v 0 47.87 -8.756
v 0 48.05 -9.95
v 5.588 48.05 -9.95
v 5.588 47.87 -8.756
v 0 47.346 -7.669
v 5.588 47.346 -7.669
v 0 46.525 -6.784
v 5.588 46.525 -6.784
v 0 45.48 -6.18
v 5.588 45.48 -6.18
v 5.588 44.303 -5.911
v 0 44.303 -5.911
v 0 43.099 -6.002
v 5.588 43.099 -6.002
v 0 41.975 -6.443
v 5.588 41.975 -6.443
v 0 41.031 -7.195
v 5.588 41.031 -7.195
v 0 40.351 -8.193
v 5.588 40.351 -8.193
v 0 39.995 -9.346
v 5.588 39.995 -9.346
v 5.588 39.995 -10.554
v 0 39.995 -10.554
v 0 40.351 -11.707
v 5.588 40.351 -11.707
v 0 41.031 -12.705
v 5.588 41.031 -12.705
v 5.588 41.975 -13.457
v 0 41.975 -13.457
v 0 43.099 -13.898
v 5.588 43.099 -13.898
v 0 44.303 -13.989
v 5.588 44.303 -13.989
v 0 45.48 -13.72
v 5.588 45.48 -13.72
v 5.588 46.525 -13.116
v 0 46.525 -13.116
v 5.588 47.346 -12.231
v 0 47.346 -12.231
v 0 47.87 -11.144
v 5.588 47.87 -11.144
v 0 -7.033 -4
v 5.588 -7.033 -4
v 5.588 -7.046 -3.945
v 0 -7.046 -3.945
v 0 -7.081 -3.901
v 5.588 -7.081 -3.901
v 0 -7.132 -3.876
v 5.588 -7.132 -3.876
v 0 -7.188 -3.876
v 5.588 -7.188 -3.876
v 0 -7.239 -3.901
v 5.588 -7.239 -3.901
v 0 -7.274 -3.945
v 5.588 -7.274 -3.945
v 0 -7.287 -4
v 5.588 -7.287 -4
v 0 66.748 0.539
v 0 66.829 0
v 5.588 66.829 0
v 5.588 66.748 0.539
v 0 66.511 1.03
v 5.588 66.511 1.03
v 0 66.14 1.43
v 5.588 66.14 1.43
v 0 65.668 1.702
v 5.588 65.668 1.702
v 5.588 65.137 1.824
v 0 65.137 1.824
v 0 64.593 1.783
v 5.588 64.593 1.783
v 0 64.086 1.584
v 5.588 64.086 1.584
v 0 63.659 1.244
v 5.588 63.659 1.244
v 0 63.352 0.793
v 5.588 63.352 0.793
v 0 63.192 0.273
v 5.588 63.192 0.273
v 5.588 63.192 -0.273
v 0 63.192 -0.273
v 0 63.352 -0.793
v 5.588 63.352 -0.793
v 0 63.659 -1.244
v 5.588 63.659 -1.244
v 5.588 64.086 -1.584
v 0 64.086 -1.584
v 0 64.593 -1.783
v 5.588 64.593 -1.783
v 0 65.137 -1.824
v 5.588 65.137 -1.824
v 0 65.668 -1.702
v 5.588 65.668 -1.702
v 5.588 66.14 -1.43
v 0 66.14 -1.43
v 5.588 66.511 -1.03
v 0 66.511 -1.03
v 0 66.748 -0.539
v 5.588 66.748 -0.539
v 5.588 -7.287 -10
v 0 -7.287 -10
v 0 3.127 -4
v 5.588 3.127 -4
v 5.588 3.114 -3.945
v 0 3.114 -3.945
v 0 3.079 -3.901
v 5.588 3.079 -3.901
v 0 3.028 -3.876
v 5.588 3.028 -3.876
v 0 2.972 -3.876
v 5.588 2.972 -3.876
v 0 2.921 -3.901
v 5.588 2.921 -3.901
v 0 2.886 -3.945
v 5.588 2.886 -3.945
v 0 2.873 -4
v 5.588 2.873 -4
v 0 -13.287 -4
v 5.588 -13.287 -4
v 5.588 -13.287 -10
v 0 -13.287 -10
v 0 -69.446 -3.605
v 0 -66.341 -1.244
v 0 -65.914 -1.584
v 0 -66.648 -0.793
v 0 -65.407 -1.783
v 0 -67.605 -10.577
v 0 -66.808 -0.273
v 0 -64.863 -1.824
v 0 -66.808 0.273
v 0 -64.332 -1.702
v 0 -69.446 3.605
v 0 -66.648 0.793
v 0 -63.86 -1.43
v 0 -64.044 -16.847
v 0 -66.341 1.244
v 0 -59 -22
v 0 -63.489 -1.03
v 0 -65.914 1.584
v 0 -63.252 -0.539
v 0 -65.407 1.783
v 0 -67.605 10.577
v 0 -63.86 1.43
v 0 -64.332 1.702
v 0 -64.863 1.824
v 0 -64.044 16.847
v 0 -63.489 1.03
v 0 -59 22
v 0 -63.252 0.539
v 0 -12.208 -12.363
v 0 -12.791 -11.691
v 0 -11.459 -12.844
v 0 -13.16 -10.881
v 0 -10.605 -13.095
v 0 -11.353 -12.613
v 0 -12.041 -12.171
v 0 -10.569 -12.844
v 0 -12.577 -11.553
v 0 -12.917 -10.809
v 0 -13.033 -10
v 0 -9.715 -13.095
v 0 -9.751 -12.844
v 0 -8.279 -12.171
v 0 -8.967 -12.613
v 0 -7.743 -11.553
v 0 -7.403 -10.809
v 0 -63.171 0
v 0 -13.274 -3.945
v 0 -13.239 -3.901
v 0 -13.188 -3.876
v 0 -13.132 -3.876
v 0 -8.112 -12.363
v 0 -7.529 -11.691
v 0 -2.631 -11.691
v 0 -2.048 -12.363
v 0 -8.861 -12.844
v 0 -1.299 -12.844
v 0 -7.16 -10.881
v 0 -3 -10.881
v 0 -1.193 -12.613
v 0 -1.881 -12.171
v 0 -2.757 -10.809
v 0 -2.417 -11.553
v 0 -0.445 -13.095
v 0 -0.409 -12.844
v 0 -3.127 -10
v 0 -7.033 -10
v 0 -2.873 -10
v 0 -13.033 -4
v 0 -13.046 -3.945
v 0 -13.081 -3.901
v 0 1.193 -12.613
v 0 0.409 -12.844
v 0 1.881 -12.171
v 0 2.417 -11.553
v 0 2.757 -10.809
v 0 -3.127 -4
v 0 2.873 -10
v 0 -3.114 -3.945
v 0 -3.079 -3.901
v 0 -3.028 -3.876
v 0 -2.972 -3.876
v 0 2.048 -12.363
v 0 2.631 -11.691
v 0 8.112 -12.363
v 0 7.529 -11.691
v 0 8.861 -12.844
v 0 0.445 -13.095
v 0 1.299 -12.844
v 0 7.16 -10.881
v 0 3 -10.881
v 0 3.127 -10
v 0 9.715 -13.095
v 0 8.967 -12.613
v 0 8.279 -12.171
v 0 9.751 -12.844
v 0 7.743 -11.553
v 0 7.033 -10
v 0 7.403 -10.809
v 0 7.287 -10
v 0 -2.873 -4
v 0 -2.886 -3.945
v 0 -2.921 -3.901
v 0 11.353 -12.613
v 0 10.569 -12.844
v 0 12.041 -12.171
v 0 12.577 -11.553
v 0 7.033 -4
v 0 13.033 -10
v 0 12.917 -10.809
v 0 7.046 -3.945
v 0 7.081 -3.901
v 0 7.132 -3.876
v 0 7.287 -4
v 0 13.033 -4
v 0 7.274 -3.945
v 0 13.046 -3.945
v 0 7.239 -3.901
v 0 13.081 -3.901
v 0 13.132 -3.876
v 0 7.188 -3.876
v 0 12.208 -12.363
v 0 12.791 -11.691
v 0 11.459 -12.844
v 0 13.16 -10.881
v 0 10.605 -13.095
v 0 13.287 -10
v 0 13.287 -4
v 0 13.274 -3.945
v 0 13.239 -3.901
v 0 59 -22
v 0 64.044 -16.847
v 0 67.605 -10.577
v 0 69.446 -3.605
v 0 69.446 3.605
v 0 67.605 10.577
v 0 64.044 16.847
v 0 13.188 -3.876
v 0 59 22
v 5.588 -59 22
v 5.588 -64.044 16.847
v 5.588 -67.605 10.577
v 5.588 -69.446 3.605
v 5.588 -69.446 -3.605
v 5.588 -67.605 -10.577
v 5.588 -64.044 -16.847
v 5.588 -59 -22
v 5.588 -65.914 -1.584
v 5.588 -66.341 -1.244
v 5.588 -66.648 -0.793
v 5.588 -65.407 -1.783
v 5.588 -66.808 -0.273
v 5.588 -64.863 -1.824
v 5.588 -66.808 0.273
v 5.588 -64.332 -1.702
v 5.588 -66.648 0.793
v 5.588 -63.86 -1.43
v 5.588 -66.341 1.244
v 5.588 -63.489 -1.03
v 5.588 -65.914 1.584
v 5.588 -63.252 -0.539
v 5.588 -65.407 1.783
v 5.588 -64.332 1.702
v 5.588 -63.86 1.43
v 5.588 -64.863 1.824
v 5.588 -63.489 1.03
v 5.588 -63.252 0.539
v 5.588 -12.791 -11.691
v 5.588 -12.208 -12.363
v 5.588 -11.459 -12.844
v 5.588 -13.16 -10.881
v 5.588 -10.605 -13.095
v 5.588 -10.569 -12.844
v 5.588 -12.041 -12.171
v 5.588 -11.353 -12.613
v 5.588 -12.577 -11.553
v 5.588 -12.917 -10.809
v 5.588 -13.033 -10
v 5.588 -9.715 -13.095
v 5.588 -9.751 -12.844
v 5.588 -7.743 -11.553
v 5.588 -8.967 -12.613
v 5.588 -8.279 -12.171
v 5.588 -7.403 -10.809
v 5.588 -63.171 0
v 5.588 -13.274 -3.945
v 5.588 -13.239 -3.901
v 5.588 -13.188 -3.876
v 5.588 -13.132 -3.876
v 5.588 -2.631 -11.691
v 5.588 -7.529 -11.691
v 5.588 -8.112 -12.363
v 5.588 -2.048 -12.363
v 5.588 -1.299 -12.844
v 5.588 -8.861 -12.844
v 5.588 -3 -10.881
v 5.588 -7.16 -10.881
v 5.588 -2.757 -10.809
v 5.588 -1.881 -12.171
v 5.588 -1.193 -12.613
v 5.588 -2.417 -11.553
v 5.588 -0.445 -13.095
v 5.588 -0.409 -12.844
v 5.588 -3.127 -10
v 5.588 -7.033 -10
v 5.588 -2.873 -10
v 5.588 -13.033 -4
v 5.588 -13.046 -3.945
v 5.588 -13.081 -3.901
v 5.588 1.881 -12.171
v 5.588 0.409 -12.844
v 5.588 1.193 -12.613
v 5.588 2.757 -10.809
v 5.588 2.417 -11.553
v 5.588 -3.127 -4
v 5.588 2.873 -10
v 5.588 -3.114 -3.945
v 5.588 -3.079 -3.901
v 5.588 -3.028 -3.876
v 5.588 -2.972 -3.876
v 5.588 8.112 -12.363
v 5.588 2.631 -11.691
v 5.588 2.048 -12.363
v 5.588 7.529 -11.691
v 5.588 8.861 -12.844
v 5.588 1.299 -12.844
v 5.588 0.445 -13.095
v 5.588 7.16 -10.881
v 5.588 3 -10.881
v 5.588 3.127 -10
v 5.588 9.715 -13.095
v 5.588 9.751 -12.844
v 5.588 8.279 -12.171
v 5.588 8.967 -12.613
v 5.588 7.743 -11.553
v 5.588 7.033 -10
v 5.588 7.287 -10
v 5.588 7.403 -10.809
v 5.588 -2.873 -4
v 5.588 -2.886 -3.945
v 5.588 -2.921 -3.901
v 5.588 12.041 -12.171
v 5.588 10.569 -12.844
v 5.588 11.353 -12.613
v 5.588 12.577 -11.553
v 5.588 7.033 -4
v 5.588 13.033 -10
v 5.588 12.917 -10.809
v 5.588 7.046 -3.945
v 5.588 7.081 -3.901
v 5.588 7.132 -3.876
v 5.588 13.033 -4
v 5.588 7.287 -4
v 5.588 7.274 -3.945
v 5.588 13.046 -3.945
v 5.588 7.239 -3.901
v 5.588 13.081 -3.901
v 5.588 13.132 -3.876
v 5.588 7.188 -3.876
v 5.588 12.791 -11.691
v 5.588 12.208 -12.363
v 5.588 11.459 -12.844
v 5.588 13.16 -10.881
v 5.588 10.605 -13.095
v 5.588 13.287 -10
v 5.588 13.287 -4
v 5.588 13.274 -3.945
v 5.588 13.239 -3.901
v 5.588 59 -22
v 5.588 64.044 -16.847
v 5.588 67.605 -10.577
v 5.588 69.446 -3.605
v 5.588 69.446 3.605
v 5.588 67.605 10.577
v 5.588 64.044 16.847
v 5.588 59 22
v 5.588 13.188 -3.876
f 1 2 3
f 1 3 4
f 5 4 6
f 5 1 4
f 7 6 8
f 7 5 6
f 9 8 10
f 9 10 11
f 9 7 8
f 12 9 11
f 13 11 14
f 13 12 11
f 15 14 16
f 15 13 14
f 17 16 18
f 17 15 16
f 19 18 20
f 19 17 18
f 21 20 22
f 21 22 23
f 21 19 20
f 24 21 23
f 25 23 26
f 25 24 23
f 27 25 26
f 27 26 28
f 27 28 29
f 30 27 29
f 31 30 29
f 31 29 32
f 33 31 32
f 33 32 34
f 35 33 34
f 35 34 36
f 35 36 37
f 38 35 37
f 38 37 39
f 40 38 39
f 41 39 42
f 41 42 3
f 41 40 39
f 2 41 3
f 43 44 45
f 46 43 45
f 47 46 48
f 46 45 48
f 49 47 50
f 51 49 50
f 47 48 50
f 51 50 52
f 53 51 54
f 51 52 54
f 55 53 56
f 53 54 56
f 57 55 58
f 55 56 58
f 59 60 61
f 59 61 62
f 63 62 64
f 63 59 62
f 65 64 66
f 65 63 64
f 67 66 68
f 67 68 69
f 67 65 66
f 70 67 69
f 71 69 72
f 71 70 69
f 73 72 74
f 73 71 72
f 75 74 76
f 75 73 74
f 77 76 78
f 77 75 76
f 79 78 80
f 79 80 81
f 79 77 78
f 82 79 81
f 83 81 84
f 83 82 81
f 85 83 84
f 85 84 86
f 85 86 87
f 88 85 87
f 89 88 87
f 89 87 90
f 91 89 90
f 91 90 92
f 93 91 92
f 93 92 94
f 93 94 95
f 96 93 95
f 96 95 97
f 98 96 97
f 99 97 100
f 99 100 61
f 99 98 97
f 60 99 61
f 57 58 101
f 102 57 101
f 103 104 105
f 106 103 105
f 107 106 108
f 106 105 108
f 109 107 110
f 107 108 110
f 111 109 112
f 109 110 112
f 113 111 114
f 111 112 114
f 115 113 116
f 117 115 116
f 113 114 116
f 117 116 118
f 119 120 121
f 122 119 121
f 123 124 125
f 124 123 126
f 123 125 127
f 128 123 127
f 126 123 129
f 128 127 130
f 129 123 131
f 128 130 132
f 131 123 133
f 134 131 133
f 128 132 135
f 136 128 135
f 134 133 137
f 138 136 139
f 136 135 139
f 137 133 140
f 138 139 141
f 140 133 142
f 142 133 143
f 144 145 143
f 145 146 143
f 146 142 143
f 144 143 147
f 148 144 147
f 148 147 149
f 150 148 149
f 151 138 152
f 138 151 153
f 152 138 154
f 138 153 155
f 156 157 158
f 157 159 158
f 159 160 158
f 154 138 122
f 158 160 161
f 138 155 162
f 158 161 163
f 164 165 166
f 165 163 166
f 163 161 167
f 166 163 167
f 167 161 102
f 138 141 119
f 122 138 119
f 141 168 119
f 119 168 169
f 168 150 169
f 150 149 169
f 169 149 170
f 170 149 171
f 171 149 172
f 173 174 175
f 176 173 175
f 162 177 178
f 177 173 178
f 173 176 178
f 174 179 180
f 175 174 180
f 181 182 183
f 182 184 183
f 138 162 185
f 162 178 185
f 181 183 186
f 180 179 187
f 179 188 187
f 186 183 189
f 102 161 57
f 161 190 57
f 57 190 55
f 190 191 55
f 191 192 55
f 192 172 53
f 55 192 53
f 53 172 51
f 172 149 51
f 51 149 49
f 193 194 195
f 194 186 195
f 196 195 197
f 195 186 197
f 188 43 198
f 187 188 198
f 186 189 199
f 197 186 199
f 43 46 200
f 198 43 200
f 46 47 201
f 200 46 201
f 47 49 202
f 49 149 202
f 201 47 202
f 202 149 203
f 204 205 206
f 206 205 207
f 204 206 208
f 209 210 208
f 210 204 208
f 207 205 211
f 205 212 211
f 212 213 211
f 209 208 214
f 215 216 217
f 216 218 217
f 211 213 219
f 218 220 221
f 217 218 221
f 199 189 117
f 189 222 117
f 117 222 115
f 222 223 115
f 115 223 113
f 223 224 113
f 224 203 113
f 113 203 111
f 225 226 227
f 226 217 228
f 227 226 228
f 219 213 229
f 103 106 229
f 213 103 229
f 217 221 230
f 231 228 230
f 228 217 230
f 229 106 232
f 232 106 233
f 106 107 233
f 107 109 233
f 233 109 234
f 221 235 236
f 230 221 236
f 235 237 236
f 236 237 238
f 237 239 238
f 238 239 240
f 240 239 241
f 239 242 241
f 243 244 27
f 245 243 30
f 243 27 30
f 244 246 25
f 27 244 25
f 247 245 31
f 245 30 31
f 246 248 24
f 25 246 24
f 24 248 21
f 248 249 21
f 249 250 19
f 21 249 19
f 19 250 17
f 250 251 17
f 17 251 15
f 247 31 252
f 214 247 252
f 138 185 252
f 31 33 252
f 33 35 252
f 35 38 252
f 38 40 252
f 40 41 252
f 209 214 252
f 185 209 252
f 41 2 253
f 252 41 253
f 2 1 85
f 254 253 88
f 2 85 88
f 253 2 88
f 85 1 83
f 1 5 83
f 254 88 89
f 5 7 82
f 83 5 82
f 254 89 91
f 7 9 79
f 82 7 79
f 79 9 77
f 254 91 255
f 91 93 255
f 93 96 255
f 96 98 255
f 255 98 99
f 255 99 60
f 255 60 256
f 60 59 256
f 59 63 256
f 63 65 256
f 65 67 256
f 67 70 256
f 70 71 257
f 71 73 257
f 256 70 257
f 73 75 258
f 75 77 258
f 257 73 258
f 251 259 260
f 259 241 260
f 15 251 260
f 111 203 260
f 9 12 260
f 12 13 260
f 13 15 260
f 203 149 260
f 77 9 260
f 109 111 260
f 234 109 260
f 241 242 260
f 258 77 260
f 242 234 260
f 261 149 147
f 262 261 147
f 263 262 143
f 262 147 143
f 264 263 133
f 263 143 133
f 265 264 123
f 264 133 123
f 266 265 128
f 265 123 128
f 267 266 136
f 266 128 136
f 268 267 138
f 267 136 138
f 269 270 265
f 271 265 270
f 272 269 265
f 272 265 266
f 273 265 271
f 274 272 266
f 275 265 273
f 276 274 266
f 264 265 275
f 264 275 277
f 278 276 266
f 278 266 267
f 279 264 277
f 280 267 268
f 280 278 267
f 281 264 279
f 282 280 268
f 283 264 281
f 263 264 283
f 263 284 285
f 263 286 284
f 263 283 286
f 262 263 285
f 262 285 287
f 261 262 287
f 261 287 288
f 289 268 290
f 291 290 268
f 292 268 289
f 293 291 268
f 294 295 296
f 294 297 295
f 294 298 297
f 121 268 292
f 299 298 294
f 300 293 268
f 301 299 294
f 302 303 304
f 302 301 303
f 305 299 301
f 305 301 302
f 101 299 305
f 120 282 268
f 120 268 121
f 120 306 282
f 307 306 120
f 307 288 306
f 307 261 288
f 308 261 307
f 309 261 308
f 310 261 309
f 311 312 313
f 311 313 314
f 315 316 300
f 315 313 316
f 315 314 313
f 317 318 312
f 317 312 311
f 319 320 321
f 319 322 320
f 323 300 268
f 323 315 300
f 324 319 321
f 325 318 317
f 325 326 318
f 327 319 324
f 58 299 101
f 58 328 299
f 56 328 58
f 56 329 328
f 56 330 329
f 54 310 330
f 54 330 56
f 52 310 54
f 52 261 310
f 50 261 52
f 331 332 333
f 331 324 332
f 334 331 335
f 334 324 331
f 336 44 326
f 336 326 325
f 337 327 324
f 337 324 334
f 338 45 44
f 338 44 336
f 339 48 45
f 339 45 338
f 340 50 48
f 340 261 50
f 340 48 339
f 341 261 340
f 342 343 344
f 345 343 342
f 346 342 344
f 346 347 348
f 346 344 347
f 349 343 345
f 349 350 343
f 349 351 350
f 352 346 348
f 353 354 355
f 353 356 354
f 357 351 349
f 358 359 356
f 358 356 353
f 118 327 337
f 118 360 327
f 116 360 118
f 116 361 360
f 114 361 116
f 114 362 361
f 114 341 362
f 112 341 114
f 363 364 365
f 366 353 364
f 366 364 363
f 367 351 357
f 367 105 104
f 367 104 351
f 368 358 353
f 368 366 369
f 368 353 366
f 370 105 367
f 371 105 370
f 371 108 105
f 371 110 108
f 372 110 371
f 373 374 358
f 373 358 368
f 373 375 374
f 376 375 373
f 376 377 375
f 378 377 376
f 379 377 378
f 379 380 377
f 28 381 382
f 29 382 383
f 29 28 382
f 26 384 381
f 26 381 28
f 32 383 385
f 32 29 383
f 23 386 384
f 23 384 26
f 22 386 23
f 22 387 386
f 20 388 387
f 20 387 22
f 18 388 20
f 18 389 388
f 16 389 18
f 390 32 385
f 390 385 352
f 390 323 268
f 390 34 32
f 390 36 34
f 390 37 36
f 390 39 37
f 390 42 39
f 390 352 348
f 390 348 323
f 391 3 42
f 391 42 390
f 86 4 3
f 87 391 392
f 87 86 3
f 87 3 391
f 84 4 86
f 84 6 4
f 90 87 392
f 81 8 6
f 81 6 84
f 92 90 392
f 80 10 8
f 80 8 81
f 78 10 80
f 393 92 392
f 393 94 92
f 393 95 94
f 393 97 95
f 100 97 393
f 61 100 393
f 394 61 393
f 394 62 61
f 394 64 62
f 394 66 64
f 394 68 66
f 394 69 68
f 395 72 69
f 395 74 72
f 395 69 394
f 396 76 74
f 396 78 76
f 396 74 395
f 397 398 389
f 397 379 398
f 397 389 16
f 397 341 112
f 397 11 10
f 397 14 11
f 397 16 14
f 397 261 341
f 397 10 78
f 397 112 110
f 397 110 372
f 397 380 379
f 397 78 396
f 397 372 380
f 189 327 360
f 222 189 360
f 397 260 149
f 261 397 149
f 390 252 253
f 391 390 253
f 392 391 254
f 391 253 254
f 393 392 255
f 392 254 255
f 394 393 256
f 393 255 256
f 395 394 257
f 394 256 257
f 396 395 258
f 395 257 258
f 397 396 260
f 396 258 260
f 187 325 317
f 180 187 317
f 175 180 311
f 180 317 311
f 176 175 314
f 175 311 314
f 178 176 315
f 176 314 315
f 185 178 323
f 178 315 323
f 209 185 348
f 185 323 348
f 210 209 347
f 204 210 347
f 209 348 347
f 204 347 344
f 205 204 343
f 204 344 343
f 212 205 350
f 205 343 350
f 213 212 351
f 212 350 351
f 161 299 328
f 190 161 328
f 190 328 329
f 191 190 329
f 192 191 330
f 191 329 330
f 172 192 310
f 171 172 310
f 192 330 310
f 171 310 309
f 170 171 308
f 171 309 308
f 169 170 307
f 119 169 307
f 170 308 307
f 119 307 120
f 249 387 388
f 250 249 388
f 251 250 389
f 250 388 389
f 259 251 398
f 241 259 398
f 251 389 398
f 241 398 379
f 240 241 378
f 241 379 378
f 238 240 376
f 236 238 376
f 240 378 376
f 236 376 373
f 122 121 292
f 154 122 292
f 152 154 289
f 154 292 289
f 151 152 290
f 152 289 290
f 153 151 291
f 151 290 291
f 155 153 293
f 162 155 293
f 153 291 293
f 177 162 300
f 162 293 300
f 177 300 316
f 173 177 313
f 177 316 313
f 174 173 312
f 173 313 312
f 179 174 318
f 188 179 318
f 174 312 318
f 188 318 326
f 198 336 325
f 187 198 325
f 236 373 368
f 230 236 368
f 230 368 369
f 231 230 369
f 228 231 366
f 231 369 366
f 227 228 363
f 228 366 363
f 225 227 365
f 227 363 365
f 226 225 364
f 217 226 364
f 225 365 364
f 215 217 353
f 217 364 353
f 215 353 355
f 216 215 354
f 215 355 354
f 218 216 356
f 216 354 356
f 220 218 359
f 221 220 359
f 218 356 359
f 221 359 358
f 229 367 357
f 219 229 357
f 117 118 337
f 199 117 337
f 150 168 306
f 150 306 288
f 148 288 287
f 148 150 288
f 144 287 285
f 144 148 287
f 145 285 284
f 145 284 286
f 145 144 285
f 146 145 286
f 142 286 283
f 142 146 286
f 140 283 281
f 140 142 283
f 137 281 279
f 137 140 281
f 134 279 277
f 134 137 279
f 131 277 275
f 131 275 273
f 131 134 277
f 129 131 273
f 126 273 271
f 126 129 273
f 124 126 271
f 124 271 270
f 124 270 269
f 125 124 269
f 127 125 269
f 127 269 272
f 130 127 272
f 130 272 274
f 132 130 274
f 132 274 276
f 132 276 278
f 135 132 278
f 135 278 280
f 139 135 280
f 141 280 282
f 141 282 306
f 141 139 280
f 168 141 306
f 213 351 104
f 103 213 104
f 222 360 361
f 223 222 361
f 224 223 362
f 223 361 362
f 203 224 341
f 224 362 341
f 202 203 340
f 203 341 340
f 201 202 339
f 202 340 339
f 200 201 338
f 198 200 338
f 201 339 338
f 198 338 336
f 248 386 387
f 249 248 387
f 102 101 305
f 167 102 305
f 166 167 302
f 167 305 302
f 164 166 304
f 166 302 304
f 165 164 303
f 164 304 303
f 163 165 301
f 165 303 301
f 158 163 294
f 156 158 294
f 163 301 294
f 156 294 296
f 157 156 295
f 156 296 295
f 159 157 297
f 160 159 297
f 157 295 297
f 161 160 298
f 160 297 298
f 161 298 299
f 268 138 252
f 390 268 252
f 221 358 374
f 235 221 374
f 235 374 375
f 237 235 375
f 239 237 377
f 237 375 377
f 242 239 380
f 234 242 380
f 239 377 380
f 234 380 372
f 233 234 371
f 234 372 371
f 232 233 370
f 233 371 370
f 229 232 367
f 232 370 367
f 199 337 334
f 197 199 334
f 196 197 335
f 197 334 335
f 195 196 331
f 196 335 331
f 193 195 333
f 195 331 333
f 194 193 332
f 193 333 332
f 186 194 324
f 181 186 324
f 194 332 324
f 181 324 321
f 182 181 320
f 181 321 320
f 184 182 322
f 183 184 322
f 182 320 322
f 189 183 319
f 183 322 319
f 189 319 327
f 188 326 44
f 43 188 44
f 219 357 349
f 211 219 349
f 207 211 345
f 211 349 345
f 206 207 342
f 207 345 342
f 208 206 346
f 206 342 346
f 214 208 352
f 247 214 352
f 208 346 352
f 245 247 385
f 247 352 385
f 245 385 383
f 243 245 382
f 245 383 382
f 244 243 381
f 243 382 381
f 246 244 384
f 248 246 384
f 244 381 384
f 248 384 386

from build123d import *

# Parameters (mm, degrees)
F0_R     = 4.05
F0_R_2   = 1.8288
F1_DEPTH = 5.588
F3_DEPTH = 5.588


with BuildPart() as f1:
    # F0 (on Right) → F1 (new body)
    with BuildSketch(Plane.YZ):
        with BuildLine():
            ThreePointArc((59, -22), (69.679492, 0), (59, 22))
            Line((59, 22), (-59, 22))
            ThreePointArc((-59, 22), (-69.679492, 0), (-59, -22))
            Line((-59, -22), (59, -22))
        make_face()
        with Locations((44, -9.95)):
            Circle(F0_R, mode=Mode.SUBTRACT)
        with Locations((-65, 0)):
            Circle(F0_R_2, mode=Mode.SUBTRACT)
        with Locations((65, 0)):
            Circle(F0_R_2, mode=Mode.SUBTRACT)
    extrude(amount=F1_DEPTH)

    # F2 (on face) → F3 (cut, through all)
    with BuildSketch(Plane.YZ.offset(5.588)):
        with BuildLine():
            ThreePointArc((7.287, -4), (7.16, -3.873), (7.033, -4))
            Line((7.033, -4), (7.033, -10))
            ThreePointArc((7.033, -10), (10.16, -13.127), (13.287, -10))
            Line((13.287, -10), (13.287, -4))
            ThreePointArc((13.287, -4), (13.16, -3.873), (13.033, -4))
            Line((13.033, -4), (13.033, -10))
            ThreePointArc((13.033, -10), (10.16, -12.873), (7.287, -10))
            Line((7.287, -10), (7.287, -4))
        make_face()
        with BuildLine():
            ThreePointArc((2.873, -10), (0, -12.873), (-2.873, -10))
            Line((-2.873, -10), (-2.873, -4))
            ThreePointArc((-2.873, -4), (-3, -3.873), (-3.127, -4))
            Line((-3.127, -4), (-3.127, -10))
            ThreePointArc((-3.127, -10), (0, -13.127), (3.127, -10))
            Line((3.127, -10), (3.127, -4))
            ThreePointArc((3.127, -4), (3, -3.873), (2.873, -4))
            Line((2.873, -4), (2.873, -10))
        make_face()
        with BuildLine():
            ThreePointArc((-7.287, -10), (-10.16, -12.873), (-13.033, -10))
            Line((-13.033, -10), (-13.033, -4))
            ThreePointArc((-13.033, -4), (-13.16, -3.873), (-13.287, -4))
            Line((-13.287, -4), (-13.287, -10))
            ThreePointArc((-13.287, -10), (-10.16, -13.127), (-7.033, -10))
            Line((-7.033, -10), (-7.033, -4))
            ThreePointArc((-7.033, -4), (-7.16, -3.873), (-7.287, -4))
            Line((-7.287, -4), (-7.287, -10))
        make_face()
    extrude(amount=-F3_DEPTH, mode=Mode.SUBTRACT)


solid = f1.part
